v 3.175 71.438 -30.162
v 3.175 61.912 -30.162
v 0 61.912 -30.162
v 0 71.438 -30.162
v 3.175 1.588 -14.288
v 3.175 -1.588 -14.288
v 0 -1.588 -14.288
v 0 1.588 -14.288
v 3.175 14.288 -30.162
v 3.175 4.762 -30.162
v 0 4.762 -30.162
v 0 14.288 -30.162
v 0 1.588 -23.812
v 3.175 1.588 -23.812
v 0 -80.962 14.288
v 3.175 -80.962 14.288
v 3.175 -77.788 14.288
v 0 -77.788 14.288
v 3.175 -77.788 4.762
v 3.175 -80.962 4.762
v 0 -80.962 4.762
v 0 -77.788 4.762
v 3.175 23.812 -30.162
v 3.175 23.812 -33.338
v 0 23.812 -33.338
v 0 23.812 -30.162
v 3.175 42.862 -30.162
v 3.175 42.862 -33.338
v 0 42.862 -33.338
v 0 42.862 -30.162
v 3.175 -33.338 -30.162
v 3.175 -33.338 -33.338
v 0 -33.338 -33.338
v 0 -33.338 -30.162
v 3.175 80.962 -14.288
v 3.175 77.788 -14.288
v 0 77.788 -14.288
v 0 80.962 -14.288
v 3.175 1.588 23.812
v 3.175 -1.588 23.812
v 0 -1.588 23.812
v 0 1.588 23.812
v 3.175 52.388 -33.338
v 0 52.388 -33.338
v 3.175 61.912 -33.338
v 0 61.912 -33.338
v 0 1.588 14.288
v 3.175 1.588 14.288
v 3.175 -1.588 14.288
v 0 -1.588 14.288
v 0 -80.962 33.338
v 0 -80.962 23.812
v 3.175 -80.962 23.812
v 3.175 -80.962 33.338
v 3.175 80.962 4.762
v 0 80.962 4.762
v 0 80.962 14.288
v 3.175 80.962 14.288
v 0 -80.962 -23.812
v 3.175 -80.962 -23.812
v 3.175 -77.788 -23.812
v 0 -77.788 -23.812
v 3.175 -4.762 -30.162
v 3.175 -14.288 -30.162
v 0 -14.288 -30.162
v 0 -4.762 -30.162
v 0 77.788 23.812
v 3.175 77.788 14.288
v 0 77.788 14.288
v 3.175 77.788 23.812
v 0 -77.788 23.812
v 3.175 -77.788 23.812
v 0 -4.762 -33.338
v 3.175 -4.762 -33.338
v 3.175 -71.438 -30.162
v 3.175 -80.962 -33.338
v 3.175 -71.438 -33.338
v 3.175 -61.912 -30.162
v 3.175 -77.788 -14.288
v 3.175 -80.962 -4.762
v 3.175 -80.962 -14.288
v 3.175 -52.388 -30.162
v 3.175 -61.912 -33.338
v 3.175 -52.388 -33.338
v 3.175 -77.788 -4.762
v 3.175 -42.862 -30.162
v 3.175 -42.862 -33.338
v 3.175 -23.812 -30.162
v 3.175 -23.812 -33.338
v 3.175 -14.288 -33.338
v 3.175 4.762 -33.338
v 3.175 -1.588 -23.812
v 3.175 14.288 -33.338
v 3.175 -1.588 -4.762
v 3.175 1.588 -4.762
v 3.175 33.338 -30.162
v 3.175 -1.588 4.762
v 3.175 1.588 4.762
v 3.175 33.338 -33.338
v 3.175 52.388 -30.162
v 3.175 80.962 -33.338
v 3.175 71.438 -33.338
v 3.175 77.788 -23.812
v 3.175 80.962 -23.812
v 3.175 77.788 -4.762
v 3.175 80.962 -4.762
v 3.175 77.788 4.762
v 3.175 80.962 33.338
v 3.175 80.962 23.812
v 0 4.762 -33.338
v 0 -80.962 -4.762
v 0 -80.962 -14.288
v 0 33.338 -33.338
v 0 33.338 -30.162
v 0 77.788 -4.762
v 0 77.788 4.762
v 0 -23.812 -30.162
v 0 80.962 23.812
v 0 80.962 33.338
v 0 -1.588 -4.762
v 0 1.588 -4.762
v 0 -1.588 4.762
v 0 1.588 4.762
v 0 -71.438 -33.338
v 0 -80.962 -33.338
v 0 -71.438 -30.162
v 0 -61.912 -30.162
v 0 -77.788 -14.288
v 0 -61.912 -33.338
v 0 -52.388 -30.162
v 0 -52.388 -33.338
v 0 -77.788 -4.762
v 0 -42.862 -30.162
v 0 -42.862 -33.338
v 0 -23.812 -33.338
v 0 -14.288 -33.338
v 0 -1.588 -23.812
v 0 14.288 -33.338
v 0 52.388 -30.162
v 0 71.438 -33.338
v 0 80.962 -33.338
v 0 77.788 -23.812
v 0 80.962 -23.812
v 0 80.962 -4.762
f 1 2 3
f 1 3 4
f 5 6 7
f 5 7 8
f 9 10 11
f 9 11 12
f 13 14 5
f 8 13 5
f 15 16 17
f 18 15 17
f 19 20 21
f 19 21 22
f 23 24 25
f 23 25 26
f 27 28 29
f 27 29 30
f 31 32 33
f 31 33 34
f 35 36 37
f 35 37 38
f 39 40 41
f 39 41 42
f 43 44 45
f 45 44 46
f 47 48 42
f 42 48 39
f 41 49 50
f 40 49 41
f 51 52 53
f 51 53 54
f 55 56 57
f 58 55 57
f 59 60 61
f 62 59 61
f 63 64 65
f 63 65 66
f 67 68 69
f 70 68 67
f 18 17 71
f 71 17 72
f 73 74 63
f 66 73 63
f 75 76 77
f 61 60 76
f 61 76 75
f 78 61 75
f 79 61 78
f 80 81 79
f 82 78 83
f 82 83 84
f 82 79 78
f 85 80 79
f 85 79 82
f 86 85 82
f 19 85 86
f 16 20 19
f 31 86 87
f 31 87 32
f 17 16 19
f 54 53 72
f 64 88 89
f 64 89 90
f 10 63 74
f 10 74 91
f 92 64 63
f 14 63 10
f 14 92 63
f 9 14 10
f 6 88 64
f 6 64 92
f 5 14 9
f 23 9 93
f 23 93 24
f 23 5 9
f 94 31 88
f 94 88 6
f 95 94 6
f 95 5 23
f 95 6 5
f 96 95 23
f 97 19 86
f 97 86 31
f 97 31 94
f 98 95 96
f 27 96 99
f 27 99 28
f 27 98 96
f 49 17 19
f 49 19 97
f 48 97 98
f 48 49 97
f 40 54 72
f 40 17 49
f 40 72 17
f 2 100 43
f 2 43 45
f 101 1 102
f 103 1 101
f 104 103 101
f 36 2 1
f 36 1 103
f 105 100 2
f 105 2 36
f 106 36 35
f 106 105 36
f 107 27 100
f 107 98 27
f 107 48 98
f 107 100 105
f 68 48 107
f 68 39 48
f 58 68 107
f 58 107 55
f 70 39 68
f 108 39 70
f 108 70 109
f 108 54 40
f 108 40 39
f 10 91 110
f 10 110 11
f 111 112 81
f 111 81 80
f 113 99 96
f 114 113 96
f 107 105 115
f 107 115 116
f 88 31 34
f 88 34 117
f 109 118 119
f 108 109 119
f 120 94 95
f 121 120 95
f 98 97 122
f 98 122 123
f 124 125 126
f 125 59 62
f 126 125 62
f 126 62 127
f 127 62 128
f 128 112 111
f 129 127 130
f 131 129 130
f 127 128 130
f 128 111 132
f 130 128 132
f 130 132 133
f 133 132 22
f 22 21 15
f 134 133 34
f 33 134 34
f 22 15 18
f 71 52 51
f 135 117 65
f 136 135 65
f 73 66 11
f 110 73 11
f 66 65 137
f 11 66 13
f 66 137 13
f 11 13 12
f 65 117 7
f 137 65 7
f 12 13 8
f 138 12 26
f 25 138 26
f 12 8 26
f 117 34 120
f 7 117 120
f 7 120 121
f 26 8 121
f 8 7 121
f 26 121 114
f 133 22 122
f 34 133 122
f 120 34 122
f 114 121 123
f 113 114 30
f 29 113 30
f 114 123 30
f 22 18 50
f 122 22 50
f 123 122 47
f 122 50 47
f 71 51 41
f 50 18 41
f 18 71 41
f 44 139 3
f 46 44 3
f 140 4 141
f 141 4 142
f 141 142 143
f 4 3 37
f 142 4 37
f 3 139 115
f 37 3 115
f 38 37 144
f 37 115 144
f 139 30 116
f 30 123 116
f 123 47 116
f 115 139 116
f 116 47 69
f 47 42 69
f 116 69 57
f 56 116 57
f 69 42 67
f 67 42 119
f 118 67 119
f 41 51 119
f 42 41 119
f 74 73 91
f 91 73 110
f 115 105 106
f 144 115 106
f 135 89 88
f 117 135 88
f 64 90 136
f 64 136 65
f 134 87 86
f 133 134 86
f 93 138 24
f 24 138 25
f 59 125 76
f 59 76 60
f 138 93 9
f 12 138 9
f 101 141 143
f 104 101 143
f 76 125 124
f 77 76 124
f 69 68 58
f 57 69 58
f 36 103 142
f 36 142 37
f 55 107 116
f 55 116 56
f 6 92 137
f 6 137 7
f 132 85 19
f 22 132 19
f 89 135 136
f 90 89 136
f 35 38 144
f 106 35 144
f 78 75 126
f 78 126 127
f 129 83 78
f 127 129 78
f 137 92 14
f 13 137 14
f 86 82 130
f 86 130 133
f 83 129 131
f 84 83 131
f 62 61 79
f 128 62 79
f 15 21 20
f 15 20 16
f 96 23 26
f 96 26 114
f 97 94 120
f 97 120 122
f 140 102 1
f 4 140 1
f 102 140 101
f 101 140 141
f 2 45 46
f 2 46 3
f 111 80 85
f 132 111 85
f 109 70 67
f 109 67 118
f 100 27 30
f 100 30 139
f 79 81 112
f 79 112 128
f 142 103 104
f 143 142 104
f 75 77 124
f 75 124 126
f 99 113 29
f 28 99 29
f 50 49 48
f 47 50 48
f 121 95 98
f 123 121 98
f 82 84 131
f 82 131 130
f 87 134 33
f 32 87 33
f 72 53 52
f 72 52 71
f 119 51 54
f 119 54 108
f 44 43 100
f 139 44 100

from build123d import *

# Parameters (mm, degrees)
F0_W     = 161.925
F0_H     = 66.675
F1_DEPTH = 3.175
F2_W     = 3.175
F2_H     = 9.525
F3_DEPTH = 3.176
F4_W     = 9.525
F4_H     = 3.175
F5_DEPTH = 3.176


with BuildPart() as f1:
    # F0 (on Right) → F1 (new body)
    with BuildSketch(Plane.YZ):
        Rectangle(F0_W, F0_H)
    extrude(amount=F1_DEPTH)

    # F2 (on face) → F3 (cut, through all)
    with BuildSketch(Plane.YZ.offset(3.175)):
        with Locations((-79.375, -19.05)):
            Rectangle(F2_W, F2_H)
        with Locations((-79.375, 0)):
            Rectangle(F2_W, F2_H)
        with Locations((-79.375, 19.05)):
            Rectangle(F2_W, F2_H)
        with Locations((0, -19.05)):
            Rectangle(F2_W, F2_H)
        Rectangle(F2_W, F2_H)
        with Locations((0, 19.05)):
            Rectangle(F2_W, F2_H)
        with Locations((79.375, -19.05)):
            Rectangle(F2_W, F2_H)
        with Locations((79.375, 0)):
            Rectangle(F2_W, F2_H)
        with Locations((79.375, 19.05)):
            Rectangle(F2_W, F2_H)
    extrude(amount=-F3_DEPTH, mode=Mode.SUBTRACT)

    # F4 (on face) → F5 (cut, through all)
    with BuildSketch(Plane.YZ.offset(3.175)):
        with Locations((-66.675, -31.75)):
            Rectangle(F4_W, F4_H)
        with Locations((-47.625, -31.75)):
            Rectangle(F4_W, F4_H)
        with Locations((-28.575, -31.75)):
            Rectangle(F4_W, F4_H)
        with Locations((-9.525, -31.75)):
            Rectangle(F4_W, F4_H)
        with Locations((9.525, -31.75)):
            Rectangle(F4_W, F4_H)
        with Locations((28.575, -31.75)):
            Rectangle(F4_W, F4_H)
        with Locations((47.625, -31.75)):
            Rectangle(F4_W, F4_H)
        with Locations((66.675, -31.75)):
            Rectangle(F4_W, F4_H)
    extrude(amount=-F5_DEPTH, mode=Mode.SUBTRACT)


solid = f1.part
